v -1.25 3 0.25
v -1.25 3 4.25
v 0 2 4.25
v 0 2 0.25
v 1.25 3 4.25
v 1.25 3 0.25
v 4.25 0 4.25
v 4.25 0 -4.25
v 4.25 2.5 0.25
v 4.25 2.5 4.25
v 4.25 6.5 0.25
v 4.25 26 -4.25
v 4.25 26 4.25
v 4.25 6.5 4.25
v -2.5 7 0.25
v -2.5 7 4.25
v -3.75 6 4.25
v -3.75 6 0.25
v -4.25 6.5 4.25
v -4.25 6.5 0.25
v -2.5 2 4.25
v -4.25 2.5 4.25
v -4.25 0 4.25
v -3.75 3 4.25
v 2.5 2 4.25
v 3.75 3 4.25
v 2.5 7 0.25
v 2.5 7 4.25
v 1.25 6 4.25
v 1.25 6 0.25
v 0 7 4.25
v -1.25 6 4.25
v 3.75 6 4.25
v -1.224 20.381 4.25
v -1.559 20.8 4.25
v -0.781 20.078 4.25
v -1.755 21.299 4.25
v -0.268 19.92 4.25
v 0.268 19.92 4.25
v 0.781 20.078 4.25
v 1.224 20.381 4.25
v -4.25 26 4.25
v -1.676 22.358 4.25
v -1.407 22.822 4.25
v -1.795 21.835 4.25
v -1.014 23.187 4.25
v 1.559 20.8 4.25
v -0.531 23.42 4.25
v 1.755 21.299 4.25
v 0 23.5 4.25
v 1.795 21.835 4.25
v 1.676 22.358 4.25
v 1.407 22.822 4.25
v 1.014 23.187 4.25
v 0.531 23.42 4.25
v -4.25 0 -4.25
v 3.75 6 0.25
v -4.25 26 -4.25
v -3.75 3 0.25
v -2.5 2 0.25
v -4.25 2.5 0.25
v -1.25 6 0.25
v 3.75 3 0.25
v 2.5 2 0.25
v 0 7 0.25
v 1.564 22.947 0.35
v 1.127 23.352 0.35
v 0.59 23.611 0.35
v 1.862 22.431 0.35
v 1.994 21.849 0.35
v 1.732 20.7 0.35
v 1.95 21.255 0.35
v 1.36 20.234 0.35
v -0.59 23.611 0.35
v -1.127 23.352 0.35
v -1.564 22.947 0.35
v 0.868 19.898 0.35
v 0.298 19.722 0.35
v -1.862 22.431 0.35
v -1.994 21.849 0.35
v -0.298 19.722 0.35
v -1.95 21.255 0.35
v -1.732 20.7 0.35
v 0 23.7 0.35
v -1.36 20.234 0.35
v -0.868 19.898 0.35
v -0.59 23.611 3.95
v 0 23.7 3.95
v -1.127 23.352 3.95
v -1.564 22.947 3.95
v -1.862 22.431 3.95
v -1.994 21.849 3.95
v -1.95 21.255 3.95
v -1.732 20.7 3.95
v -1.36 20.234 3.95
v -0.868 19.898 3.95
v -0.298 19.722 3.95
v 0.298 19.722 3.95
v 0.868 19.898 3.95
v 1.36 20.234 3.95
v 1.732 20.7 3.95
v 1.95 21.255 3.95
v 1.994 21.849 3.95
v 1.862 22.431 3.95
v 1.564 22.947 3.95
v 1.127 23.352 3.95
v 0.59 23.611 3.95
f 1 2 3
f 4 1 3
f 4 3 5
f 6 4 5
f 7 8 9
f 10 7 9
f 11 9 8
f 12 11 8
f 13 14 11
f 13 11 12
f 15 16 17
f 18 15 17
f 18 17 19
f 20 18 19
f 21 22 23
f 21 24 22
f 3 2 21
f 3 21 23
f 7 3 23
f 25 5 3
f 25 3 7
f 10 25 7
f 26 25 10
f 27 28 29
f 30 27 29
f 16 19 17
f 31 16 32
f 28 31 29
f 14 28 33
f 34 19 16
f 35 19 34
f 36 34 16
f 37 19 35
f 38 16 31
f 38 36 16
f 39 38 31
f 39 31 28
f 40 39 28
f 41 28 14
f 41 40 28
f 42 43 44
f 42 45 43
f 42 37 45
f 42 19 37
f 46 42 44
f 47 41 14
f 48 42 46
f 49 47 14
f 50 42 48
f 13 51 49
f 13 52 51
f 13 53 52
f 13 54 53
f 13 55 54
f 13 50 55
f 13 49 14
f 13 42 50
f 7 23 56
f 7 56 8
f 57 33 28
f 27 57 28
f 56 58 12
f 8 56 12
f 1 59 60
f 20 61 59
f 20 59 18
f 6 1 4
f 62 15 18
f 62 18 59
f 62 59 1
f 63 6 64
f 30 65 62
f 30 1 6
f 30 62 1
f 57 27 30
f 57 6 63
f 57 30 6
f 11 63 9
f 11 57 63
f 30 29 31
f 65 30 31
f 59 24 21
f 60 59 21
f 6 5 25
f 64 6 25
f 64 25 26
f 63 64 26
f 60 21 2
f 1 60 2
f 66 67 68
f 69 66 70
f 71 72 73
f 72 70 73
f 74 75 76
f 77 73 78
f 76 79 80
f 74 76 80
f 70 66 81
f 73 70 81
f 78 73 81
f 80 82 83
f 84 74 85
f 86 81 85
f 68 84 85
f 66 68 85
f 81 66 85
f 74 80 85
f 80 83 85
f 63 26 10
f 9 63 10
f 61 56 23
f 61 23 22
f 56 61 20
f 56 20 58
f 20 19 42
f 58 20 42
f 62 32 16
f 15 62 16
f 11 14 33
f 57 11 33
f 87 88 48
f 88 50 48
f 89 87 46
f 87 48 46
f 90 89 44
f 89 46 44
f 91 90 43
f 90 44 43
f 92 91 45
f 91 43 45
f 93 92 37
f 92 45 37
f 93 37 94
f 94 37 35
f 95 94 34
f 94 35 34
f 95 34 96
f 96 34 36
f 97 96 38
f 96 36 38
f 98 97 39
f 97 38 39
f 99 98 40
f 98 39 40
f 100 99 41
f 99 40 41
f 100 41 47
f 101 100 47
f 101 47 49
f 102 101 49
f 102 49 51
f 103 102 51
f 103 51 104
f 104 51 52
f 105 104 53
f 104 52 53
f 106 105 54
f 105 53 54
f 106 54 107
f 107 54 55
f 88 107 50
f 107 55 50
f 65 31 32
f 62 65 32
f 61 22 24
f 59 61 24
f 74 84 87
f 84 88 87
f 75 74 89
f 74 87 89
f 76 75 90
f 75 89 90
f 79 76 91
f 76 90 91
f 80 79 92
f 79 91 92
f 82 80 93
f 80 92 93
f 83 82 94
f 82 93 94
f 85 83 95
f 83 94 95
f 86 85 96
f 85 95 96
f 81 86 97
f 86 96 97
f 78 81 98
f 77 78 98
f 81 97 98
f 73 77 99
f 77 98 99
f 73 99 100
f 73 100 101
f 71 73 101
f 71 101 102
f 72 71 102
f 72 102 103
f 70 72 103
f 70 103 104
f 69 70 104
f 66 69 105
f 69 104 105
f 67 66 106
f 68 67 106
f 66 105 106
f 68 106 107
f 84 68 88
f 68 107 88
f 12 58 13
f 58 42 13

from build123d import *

# Parameters (mm, degrees)
F0_W     = 8.5
F0_H     = 26
F1_DEPTH = 4.25
F5_DEPTH = 4


with BuildPart() as f1:
    # F0 (on Top) → F1 (new body, symmetric)
    with BuildSketch(Plane.XY):
        with Locations((0, 13)):
            Rectangle(F0_W, F0_H)
    extrude(amount=F1_DEPTH, both=True)

    # F2 (on Right) → F3 (revolve, cut)
    with BuildSketch(Plane.YZ):
        Polygon((23.7, 3.95), (23.5, 4.25), (21.7, 4.25), (21.7, 0.35), (23.7, 0.35), align=None)
    revolve(axis=Axis((0, 21.7, 2.3), (0, 0, 1)), mode=Mode.SUBTRACT)

    # F4 (on face) → F5 (cut)
    with BuildSketch(Plane.XY.offset(4.25)):
        Polygon((-3.75, 6), (-4.25, 6.5), (-4.25, 2.5), (-3.75, 3), (-2.5, 2), (-1.25, 3), (0, 2), (1.25, 3), (2.5, 2), (3.75, 3), (4.25, 2.5), (4.25, 6.5), (3.75, 6), (2.5, 7), (1.25, 6), (0, 7), (-1.25, 6), (-2.5, 7), align=None)
    extrude(amount=-F5_DEPTH, mode=Mode.SUBTRACT)


solid = f1.part
